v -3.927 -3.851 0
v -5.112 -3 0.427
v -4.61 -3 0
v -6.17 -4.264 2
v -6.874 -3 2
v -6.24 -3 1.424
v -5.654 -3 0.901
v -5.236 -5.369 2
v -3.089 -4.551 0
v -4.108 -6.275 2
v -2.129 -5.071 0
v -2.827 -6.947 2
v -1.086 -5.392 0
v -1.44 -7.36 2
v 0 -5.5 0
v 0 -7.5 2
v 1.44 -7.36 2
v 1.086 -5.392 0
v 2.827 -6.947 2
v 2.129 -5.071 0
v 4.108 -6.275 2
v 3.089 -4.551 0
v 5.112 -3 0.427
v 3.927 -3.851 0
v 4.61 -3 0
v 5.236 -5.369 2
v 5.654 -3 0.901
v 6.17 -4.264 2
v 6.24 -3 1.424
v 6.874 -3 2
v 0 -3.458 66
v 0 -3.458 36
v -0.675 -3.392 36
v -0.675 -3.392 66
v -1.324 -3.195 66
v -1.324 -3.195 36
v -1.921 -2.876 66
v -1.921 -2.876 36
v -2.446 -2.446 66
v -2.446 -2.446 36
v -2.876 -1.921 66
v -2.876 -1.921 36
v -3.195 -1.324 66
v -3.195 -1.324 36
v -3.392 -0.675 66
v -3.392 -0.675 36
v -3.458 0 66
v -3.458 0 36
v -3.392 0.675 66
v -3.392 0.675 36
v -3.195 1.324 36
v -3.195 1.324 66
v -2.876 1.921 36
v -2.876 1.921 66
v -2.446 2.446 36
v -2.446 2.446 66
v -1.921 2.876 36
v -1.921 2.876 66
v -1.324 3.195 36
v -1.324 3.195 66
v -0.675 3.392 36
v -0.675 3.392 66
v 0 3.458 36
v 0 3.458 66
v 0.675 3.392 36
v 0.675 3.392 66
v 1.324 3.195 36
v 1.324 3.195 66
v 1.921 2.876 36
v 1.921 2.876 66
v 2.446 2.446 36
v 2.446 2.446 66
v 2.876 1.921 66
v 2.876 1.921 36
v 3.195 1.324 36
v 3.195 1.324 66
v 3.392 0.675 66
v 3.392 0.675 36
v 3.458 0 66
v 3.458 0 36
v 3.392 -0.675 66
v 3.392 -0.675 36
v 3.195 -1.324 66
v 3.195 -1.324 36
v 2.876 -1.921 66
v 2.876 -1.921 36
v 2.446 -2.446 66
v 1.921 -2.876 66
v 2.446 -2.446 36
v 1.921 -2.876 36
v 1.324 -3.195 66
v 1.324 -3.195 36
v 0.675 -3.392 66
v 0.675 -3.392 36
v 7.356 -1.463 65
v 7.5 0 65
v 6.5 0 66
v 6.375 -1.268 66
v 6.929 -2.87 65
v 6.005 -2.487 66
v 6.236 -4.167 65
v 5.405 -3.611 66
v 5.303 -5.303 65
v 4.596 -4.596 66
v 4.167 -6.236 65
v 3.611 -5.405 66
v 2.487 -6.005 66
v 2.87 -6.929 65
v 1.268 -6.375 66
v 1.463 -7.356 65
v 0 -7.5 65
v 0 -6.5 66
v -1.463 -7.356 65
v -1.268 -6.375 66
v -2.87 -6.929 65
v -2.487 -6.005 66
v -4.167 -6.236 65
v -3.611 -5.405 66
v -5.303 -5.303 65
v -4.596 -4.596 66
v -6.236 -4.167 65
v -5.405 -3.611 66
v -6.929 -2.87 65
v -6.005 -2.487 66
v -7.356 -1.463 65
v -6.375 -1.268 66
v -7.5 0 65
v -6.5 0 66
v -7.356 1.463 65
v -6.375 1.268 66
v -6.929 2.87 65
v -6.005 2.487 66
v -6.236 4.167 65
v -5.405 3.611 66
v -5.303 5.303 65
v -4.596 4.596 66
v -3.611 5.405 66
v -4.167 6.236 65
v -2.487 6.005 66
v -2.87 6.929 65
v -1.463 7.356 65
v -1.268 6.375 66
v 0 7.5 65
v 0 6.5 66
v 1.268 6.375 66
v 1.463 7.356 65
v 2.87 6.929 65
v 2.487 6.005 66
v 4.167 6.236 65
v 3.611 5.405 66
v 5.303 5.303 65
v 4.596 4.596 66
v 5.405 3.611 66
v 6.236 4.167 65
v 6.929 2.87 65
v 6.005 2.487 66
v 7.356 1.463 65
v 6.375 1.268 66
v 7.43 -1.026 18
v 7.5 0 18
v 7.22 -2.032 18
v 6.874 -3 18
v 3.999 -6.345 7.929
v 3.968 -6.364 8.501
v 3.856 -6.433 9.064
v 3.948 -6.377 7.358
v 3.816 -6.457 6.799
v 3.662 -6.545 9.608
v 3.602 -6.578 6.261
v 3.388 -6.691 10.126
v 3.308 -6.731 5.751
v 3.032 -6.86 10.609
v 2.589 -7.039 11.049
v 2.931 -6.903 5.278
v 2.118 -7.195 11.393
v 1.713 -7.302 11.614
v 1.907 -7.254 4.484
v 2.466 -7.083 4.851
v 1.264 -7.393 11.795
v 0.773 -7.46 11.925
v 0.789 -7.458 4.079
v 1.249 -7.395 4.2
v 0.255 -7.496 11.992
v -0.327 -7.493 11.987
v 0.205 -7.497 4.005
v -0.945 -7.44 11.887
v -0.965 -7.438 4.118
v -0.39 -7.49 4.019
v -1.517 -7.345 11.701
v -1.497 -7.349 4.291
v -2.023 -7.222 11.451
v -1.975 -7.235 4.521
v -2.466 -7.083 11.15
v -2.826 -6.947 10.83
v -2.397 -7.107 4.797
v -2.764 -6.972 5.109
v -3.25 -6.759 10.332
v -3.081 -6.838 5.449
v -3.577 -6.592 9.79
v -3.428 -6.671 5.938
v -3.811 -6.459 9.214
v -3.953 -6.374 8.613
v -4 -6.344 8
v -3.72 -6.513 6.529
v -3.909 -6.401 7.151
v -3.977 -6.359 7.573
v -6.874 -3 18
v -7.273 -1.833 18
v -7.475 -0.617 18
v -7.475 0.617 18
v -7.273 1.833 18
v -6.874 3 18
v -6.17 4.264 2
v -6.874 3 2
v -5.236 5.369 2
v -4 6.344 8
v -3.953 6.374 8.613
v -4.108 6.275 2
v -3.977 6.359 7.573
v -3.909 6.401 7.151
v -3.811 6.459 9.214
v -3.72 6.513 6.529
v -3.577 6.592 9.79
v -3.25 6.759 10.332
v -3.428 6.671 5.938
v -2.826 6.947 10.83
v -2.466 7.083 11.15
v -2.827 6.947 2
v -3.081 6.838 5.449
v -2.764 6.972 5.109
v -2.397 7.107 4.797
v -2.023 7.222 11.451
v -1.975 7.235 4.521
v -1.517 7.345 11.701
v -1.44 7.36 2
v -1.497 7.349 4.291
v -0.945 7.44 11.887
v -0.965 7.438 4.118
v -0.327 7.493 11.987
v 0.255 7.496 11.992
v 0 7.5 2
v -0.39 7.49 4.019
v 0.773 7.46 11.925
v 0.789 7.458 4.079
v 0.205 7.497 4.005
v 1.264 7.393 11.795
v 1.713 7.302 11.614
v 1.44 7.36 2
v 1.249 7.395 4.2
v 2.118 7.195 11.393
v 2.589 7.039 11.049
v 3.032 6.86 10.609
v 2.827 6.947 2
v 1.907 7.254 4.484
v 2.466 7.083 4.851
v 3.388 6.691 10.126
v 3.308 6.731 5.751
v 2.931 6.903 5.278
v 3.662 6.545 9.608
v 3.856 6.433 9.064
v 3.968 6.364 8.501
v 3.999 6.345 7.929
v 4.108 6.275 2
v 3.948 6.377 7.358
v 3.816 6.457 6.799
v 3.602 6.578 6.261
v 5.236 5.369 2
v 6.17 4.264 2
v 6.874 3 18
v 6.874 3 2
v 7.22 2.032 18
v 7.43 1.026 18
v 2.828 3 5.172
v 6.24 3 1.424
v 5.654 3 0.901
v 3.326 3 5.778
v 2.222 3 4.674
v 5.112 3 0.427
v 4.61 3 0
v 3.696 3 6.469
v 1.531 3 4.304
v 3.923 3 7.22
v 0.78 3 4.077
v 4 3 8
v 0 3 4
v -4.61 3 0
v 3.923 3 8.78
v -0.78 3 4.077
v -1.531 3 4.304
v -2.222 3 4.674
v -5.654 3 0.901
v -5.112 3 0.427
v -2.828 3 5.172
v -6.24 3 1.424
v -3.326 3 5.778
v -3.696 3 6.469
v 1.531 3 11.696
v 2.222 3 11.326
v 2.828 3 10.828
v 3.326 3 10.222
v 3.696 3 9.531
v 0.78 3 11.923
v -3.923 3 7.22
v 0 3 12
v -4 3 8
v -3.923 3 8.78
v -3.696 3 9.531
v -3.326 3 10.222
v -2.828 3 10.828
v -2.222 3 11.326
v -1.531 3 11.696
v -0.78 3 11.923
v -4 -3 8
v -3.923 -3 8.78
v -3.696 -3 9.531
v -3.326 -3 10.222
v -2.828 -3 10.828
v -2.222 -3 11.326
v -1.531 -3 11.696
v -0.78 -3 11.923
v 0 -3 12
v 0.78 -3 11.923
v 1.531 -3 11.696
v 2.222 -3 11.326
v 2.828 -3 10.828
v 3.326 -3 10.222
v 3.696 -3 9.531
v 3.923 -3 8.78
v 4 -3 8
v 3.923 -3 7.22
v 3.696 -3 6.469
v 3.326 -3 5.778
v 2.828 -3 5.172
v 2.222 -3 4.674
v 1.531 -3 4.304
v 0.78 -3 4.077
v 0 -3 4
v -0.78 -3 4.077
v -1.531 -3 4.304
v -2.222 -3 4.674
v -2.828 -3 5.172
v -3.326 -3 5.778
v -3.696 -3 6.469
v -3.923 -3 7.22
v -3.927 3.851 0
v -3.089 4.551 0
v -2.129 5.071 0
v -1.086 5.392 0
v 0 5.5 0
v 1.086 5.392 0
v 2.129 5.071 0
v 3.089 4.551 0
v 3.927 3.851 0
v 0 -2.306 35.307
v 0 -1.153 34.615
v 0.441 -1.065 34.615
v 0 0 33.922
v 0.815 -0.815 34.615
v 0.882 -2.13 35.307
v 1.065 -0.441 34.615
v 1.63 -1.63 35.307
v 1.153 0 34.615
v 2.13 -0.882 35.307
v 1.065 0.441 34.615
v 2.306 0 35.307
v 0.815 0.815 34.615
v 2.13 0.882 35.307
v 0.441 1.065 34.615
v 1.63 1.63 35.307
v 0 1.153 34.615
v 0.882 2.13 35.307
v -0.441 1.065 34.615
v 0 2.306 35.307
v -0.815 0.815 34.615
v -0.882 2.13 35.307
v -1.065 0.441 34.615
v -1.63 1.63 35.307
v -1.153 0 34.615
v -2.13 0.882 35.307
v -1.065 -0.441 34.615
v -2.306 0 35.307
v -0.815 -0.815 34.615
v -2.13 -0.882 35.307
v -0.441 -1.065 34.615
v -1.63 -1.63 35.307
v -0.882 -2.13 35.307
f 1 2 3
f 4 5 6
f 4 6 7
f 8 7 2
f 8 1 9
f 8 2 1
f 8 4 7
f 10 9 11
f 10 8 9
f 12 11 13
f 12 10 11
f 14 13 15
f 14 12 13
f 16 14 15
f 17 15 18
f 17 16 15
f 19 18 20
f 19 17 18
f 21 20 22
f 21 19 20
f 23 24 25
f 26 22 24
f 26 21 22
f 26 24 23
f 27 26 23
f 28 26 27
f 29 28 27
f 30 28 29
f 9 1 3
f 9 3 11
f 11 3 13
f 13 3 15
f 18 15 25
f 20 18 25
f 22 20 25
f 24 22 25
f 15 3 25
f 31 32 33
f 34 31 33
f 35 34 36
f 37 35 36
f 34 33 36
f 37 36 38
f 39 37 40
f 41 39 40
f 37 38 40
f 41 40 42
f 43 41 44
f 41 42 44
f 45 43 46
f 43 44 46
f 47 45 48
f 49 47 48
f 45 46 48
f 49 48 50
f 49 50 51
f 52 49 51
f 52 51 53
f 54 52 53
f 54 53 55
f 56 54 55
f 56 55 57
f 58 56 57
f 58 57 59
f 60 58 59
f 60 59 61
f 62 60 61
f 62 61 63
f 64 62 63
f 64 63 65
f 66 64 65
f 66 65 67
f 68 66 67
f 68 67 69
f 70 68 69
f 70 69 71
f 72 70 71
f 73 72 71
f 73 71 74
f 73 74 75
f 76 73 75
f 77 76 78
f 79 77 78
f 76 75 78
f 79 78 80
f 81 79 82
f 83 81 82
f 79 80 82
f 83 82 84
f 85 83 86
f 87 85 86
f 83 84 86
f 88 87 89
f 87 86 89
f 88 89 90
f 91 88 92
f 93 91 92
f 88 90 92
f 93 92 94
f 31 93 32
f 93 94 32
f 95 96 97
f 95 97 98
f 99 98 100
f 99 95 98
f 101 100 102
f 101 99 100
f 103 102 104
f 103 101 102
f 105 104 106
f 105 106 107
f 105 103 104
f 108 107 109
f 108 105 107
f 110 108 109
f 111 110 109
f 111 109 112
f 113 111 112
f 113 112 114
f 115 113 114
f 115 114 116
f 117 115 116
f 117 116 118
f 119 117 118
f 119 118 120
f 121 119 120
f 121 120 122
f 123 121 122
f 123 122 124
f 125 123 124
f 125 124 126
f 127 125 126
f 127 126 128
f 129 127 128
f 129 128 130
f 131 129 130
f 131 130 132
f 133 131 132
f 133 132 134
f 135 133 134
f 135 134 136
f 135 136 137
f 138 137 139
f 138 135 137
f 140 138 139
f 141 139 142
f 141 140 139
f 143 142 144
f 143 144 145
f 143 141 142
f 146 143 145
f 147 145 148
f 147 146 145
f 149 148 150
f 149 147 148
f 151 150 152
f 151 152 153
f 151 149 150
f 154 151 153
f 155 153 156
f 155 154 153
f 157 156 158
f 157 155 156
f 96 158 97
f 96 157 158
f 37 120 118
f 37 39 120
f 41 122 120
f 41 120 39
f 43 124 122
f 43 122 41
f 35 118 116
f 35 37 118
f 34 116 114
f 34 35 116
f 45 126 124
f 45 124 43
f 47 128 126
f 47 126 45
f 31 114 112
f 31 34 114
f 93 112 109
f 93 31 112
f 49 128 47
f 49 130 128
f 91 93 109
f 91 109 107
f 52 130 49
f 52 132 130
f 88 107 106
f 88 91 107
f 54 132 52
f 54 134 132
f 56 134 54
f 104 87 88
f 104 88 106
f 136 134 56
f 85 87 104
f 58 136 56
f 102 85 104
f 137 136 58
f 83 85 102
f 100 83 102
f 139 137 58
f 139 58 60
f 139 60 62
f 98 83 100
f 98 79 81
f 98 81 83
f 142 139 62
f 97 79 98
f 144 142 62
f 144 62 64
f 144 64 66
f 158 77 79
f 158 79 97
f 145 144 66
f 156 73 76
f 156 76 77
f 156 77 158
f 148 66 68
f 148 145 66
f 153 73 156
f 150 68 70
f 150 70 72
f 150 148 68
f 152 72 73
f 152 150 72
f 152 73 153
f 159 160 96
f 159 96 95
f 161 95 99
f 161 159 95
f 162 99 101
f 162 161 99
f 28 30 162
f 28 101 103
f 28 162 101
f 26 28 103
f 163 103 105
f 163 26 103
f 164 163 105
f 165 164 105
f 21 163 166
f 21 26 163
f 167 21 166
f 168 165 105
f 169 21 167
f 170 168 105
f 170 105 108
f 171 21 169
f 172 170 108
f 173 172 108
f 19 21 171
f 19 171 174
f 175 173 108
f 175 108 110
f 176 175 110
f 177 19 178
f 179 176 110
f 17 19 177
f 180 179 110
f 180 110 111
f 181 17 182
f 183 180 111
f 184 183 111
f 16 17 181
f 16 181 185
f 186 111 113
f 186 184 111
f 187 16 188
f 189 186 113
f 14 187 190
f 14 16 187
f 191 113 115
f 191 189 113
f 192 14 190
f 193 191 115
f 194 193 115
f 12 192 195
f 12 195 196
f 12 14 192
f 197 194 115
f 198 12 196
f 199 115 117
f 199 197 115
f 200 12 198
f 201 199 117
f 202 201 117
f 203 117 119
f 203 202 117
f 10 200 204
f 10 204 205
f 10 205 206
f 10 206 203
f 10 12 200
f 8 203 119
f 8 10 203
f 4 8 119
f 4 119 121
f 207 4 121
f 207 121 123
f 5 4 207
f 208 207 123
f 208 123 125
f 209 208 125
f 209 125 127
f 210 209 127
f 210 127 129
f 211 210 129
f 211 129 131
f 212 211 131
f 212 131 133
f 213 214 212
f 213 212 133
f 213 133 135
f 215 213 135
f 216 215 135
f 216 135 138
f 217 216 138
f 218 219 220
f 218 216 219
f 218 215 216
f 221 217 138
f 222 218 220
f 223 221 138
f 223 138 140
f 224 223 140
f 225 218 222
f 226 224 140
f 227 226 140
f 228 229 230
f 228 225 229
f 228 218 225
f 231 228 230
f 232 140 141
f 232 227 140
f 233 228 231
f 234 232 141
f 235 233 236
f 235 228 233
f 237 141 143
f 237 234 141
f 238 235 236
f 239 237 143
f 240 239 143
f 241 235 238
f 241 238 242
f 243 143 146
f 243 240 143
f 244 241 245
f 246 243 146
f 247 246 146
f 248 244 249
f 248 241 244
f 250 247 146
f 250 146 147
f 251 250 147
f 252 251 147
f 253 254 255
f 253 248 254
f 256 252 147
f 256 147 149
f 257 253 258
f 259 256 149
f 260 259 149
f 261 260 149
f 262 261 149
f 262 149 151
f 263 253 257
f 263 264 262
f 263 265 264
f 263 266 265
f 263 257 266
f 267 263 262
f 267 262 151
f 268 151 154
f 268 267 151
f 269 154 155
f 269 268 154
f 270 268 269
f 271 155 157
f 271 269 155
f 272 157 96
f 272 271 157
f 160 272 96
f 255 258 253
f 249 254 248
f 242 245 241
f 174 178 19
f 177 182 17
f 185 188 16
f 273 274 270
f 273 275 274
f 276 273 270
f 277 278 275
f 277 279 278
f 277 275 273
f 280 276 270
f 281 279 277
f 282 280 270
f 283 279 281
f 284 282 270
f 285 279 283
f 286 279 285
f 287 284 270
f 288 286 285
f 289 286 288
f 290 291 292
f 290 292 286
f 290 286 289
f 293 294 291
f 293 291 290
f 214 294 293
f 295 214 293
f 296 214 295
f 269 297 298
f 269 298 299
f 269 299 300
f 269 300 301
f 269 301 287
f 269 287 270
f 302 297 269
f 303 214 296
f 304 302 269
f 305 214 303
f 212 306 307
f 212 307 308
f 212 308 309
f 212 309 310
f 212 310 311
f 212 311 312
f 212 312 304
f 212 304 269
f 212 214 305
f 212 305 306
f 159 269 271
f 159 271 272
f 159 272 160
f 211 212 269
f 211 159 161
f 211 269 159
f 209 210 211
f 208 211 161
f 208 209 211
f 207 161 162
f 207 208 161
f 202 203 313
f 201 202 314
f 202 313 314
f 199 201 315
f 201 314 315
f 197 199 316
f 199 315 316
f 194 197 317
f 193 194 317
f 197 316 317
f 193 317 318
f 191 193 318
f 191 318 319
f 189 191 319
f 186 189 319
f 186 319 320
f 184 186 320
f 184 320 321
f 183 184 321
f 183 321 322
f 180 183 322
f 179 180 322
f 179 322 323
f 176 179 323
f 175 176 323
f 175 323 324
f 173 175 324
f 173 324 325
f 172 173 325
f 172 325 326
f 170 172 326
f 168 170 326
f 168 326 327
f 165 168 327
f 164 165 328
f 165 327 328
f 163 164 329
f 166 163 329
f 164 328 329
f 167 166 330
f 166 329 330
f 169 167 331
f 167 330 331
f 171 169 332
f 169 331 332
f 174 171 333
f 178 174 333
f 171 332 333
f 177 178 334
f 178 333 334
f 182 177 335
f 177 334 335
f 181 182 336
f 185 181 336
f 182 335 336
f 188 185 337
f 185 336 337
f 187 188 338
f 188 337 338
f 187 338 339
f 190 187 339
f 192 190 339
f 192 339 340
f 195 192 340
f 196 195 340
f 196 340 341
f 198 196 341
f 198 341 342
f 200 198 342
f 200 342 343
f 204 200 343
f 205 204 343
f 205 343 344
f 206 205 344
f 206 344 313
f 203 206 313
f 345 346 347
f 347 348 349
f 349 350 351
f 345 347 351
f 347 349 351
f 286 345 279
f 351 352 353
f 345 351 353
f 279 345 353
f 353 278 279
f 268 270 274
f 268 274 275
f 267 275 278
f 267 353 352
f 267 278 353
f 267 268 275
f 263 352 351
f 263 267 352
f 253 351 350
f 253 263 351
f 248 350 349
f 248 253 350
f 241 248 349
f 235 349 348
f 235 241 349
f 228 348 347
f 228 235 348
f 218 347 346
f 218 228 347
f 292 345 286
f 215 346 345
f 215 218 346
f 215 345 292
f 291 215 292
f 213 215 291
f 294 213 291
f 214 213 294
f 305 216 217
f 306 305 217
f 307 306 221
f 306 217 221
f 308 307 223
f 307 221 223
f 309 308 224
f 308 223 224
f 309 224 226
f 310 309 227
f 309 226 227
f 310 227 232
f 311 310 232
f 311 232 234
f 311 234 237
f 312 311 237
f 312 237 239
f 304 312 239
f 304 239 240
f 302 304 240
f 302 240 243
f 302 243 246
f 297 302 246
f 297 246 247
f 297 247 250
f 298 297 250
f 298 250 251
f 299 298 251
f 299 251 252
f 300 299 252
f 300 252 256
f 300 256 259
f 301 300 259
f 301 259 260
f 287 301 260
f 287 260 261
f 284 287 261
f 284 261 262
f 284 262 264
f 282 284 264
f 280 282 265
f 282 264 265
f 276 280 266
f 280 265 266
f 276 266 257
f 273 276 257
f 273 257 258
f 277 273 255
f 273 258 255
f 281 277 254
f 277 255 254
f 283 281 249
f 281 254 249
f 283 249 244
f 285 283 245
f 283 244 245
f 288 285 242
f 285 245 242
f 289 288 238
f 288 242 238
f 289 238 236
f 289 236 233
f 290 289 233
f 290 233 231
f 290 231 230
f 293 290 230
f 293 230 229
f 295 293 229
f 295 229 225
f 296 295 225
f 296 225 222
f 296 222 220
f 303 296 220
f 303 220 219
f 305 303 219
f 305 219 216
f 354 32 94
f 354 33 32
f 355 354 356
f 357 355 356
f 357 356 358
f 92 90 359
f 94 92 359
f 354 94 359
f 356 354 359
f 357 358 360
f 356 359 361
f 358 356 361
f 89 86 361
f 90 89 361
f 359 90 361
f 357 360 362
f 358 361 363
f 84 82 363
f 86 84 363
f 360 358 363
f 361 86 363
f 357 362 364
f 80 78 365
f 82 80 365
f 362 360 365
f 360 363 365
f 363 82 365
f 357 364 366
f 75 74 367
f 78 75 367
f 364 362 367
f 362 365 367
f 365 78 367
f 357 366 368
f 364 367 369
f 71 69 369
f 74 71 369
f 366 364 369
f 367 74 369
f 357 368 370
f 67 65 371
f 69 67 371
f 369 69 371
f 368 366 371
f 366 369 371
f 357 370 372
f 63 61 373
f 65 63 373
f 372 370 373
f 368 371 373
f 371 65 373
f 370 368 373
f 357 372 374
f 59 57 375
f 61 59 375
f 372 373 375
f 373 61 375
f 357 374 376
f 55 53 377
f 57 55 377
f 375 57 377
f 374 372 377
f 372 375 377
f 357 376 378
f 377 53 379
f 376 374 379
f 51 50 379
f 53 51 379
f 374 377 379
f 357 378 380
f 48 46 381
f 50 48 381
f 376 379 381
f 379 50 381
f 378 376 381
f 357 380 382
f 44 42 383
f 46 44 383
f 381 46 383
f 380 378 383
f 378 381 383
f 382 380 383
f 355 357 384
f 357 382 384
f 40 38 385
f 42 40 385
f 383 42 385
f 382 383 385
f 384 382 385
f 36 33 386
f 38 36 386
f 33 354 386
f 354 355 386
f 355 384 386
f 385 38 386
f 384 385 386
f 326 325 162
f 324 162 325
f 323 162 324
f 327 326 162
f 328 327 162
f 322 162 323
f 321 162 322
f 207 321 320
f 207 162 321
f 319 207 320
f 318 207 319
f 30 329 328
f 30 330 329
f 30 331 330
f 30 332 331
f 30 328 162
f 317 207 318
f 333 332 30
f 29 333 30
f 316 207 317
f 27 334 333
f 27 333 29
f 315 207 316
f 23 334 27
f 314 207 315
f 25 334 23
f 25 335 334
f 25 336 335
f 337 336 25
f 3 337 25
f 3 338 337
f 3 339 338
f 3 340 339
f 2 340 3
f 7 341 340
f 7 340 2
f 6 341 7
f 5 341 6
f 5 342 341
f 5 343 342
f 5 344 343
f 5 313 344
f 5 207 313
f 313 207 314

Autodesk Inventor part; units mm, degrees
ref_plane "YZ Plane" through (0, 0, 0) normal (1, 0, 0) x (0, 1, 0)
ref_plane "XZ Plane" through (0, 0, 0) normal (0, 1, 0) x (-1, 0, 0)
ref_plane "XY Plane" through (0, 0, 0) normal (0, 0, 1) x (1, 0, 0)
sketch "Sketch1" plane through (0, 0, 0) normal (0, 0, 1) x (1, 0, 0)
  line L0 (0, 12) -> (0, -9) projected
  line L1 (-9, 0) -> (12, 0) projected
  circle A0 centre (0, 0) radius 7.5
  dimension "d0" = 15
extrude "Extrusion1" add sketch "Sketch1" along normal blind 66
sketch "Sketch2" plane through (0, 0, 0) normal (1, 0, 0) x (0, 1, 0)
  line L0 (-3, -8.1335) -> (3, -8.1335)
  line L1 (3, -8.1335) -> (3, 18)
  line L2 (3, 18) -> (-3, 18)
  line L3 (-3, 18) -> (-3, -8.1335)
  line L4 (0, 88.24) -> (0, -15.5468) projected
  line L5 (-7.5, 0) -> (7.5, 0) projected
  dimension "d3" = 6
  dimension "d7" = 18
extrude "Extrusion2" cut sketch "Sketch2" along normal through all both and the other way through all
sketch "Sketch3" plane through (0, 0, 0) normal (0, 1, 0) x (-1, 0, 0)
  line L0 (0, -6.6) -> (0, 85.8) projected
  circle A0 centre (0, 8) radius 4
  line L1 (-6.8739, 0) -> (6.8739, 0) projected
  dimension "d8" = 8
  dimension "d9" = 8
extrude "Extrusion3" cut sketch "Sketch3" along normal through all both and the other way through all
chamfer "Chamfer1" distance 2 angle 45 2 edges at (0, -7.5, 0) (0, 7.5, 0)
chamfer "Chamfer2" distance 1 angle 45 1 edges at (-7.5, 0, 66)
hole "Hole1" at (0, 0, 66) direction (0, 0, -1) diameter 6.917 depth 30 tip angle 118
properties part number "Pin Pressure"
